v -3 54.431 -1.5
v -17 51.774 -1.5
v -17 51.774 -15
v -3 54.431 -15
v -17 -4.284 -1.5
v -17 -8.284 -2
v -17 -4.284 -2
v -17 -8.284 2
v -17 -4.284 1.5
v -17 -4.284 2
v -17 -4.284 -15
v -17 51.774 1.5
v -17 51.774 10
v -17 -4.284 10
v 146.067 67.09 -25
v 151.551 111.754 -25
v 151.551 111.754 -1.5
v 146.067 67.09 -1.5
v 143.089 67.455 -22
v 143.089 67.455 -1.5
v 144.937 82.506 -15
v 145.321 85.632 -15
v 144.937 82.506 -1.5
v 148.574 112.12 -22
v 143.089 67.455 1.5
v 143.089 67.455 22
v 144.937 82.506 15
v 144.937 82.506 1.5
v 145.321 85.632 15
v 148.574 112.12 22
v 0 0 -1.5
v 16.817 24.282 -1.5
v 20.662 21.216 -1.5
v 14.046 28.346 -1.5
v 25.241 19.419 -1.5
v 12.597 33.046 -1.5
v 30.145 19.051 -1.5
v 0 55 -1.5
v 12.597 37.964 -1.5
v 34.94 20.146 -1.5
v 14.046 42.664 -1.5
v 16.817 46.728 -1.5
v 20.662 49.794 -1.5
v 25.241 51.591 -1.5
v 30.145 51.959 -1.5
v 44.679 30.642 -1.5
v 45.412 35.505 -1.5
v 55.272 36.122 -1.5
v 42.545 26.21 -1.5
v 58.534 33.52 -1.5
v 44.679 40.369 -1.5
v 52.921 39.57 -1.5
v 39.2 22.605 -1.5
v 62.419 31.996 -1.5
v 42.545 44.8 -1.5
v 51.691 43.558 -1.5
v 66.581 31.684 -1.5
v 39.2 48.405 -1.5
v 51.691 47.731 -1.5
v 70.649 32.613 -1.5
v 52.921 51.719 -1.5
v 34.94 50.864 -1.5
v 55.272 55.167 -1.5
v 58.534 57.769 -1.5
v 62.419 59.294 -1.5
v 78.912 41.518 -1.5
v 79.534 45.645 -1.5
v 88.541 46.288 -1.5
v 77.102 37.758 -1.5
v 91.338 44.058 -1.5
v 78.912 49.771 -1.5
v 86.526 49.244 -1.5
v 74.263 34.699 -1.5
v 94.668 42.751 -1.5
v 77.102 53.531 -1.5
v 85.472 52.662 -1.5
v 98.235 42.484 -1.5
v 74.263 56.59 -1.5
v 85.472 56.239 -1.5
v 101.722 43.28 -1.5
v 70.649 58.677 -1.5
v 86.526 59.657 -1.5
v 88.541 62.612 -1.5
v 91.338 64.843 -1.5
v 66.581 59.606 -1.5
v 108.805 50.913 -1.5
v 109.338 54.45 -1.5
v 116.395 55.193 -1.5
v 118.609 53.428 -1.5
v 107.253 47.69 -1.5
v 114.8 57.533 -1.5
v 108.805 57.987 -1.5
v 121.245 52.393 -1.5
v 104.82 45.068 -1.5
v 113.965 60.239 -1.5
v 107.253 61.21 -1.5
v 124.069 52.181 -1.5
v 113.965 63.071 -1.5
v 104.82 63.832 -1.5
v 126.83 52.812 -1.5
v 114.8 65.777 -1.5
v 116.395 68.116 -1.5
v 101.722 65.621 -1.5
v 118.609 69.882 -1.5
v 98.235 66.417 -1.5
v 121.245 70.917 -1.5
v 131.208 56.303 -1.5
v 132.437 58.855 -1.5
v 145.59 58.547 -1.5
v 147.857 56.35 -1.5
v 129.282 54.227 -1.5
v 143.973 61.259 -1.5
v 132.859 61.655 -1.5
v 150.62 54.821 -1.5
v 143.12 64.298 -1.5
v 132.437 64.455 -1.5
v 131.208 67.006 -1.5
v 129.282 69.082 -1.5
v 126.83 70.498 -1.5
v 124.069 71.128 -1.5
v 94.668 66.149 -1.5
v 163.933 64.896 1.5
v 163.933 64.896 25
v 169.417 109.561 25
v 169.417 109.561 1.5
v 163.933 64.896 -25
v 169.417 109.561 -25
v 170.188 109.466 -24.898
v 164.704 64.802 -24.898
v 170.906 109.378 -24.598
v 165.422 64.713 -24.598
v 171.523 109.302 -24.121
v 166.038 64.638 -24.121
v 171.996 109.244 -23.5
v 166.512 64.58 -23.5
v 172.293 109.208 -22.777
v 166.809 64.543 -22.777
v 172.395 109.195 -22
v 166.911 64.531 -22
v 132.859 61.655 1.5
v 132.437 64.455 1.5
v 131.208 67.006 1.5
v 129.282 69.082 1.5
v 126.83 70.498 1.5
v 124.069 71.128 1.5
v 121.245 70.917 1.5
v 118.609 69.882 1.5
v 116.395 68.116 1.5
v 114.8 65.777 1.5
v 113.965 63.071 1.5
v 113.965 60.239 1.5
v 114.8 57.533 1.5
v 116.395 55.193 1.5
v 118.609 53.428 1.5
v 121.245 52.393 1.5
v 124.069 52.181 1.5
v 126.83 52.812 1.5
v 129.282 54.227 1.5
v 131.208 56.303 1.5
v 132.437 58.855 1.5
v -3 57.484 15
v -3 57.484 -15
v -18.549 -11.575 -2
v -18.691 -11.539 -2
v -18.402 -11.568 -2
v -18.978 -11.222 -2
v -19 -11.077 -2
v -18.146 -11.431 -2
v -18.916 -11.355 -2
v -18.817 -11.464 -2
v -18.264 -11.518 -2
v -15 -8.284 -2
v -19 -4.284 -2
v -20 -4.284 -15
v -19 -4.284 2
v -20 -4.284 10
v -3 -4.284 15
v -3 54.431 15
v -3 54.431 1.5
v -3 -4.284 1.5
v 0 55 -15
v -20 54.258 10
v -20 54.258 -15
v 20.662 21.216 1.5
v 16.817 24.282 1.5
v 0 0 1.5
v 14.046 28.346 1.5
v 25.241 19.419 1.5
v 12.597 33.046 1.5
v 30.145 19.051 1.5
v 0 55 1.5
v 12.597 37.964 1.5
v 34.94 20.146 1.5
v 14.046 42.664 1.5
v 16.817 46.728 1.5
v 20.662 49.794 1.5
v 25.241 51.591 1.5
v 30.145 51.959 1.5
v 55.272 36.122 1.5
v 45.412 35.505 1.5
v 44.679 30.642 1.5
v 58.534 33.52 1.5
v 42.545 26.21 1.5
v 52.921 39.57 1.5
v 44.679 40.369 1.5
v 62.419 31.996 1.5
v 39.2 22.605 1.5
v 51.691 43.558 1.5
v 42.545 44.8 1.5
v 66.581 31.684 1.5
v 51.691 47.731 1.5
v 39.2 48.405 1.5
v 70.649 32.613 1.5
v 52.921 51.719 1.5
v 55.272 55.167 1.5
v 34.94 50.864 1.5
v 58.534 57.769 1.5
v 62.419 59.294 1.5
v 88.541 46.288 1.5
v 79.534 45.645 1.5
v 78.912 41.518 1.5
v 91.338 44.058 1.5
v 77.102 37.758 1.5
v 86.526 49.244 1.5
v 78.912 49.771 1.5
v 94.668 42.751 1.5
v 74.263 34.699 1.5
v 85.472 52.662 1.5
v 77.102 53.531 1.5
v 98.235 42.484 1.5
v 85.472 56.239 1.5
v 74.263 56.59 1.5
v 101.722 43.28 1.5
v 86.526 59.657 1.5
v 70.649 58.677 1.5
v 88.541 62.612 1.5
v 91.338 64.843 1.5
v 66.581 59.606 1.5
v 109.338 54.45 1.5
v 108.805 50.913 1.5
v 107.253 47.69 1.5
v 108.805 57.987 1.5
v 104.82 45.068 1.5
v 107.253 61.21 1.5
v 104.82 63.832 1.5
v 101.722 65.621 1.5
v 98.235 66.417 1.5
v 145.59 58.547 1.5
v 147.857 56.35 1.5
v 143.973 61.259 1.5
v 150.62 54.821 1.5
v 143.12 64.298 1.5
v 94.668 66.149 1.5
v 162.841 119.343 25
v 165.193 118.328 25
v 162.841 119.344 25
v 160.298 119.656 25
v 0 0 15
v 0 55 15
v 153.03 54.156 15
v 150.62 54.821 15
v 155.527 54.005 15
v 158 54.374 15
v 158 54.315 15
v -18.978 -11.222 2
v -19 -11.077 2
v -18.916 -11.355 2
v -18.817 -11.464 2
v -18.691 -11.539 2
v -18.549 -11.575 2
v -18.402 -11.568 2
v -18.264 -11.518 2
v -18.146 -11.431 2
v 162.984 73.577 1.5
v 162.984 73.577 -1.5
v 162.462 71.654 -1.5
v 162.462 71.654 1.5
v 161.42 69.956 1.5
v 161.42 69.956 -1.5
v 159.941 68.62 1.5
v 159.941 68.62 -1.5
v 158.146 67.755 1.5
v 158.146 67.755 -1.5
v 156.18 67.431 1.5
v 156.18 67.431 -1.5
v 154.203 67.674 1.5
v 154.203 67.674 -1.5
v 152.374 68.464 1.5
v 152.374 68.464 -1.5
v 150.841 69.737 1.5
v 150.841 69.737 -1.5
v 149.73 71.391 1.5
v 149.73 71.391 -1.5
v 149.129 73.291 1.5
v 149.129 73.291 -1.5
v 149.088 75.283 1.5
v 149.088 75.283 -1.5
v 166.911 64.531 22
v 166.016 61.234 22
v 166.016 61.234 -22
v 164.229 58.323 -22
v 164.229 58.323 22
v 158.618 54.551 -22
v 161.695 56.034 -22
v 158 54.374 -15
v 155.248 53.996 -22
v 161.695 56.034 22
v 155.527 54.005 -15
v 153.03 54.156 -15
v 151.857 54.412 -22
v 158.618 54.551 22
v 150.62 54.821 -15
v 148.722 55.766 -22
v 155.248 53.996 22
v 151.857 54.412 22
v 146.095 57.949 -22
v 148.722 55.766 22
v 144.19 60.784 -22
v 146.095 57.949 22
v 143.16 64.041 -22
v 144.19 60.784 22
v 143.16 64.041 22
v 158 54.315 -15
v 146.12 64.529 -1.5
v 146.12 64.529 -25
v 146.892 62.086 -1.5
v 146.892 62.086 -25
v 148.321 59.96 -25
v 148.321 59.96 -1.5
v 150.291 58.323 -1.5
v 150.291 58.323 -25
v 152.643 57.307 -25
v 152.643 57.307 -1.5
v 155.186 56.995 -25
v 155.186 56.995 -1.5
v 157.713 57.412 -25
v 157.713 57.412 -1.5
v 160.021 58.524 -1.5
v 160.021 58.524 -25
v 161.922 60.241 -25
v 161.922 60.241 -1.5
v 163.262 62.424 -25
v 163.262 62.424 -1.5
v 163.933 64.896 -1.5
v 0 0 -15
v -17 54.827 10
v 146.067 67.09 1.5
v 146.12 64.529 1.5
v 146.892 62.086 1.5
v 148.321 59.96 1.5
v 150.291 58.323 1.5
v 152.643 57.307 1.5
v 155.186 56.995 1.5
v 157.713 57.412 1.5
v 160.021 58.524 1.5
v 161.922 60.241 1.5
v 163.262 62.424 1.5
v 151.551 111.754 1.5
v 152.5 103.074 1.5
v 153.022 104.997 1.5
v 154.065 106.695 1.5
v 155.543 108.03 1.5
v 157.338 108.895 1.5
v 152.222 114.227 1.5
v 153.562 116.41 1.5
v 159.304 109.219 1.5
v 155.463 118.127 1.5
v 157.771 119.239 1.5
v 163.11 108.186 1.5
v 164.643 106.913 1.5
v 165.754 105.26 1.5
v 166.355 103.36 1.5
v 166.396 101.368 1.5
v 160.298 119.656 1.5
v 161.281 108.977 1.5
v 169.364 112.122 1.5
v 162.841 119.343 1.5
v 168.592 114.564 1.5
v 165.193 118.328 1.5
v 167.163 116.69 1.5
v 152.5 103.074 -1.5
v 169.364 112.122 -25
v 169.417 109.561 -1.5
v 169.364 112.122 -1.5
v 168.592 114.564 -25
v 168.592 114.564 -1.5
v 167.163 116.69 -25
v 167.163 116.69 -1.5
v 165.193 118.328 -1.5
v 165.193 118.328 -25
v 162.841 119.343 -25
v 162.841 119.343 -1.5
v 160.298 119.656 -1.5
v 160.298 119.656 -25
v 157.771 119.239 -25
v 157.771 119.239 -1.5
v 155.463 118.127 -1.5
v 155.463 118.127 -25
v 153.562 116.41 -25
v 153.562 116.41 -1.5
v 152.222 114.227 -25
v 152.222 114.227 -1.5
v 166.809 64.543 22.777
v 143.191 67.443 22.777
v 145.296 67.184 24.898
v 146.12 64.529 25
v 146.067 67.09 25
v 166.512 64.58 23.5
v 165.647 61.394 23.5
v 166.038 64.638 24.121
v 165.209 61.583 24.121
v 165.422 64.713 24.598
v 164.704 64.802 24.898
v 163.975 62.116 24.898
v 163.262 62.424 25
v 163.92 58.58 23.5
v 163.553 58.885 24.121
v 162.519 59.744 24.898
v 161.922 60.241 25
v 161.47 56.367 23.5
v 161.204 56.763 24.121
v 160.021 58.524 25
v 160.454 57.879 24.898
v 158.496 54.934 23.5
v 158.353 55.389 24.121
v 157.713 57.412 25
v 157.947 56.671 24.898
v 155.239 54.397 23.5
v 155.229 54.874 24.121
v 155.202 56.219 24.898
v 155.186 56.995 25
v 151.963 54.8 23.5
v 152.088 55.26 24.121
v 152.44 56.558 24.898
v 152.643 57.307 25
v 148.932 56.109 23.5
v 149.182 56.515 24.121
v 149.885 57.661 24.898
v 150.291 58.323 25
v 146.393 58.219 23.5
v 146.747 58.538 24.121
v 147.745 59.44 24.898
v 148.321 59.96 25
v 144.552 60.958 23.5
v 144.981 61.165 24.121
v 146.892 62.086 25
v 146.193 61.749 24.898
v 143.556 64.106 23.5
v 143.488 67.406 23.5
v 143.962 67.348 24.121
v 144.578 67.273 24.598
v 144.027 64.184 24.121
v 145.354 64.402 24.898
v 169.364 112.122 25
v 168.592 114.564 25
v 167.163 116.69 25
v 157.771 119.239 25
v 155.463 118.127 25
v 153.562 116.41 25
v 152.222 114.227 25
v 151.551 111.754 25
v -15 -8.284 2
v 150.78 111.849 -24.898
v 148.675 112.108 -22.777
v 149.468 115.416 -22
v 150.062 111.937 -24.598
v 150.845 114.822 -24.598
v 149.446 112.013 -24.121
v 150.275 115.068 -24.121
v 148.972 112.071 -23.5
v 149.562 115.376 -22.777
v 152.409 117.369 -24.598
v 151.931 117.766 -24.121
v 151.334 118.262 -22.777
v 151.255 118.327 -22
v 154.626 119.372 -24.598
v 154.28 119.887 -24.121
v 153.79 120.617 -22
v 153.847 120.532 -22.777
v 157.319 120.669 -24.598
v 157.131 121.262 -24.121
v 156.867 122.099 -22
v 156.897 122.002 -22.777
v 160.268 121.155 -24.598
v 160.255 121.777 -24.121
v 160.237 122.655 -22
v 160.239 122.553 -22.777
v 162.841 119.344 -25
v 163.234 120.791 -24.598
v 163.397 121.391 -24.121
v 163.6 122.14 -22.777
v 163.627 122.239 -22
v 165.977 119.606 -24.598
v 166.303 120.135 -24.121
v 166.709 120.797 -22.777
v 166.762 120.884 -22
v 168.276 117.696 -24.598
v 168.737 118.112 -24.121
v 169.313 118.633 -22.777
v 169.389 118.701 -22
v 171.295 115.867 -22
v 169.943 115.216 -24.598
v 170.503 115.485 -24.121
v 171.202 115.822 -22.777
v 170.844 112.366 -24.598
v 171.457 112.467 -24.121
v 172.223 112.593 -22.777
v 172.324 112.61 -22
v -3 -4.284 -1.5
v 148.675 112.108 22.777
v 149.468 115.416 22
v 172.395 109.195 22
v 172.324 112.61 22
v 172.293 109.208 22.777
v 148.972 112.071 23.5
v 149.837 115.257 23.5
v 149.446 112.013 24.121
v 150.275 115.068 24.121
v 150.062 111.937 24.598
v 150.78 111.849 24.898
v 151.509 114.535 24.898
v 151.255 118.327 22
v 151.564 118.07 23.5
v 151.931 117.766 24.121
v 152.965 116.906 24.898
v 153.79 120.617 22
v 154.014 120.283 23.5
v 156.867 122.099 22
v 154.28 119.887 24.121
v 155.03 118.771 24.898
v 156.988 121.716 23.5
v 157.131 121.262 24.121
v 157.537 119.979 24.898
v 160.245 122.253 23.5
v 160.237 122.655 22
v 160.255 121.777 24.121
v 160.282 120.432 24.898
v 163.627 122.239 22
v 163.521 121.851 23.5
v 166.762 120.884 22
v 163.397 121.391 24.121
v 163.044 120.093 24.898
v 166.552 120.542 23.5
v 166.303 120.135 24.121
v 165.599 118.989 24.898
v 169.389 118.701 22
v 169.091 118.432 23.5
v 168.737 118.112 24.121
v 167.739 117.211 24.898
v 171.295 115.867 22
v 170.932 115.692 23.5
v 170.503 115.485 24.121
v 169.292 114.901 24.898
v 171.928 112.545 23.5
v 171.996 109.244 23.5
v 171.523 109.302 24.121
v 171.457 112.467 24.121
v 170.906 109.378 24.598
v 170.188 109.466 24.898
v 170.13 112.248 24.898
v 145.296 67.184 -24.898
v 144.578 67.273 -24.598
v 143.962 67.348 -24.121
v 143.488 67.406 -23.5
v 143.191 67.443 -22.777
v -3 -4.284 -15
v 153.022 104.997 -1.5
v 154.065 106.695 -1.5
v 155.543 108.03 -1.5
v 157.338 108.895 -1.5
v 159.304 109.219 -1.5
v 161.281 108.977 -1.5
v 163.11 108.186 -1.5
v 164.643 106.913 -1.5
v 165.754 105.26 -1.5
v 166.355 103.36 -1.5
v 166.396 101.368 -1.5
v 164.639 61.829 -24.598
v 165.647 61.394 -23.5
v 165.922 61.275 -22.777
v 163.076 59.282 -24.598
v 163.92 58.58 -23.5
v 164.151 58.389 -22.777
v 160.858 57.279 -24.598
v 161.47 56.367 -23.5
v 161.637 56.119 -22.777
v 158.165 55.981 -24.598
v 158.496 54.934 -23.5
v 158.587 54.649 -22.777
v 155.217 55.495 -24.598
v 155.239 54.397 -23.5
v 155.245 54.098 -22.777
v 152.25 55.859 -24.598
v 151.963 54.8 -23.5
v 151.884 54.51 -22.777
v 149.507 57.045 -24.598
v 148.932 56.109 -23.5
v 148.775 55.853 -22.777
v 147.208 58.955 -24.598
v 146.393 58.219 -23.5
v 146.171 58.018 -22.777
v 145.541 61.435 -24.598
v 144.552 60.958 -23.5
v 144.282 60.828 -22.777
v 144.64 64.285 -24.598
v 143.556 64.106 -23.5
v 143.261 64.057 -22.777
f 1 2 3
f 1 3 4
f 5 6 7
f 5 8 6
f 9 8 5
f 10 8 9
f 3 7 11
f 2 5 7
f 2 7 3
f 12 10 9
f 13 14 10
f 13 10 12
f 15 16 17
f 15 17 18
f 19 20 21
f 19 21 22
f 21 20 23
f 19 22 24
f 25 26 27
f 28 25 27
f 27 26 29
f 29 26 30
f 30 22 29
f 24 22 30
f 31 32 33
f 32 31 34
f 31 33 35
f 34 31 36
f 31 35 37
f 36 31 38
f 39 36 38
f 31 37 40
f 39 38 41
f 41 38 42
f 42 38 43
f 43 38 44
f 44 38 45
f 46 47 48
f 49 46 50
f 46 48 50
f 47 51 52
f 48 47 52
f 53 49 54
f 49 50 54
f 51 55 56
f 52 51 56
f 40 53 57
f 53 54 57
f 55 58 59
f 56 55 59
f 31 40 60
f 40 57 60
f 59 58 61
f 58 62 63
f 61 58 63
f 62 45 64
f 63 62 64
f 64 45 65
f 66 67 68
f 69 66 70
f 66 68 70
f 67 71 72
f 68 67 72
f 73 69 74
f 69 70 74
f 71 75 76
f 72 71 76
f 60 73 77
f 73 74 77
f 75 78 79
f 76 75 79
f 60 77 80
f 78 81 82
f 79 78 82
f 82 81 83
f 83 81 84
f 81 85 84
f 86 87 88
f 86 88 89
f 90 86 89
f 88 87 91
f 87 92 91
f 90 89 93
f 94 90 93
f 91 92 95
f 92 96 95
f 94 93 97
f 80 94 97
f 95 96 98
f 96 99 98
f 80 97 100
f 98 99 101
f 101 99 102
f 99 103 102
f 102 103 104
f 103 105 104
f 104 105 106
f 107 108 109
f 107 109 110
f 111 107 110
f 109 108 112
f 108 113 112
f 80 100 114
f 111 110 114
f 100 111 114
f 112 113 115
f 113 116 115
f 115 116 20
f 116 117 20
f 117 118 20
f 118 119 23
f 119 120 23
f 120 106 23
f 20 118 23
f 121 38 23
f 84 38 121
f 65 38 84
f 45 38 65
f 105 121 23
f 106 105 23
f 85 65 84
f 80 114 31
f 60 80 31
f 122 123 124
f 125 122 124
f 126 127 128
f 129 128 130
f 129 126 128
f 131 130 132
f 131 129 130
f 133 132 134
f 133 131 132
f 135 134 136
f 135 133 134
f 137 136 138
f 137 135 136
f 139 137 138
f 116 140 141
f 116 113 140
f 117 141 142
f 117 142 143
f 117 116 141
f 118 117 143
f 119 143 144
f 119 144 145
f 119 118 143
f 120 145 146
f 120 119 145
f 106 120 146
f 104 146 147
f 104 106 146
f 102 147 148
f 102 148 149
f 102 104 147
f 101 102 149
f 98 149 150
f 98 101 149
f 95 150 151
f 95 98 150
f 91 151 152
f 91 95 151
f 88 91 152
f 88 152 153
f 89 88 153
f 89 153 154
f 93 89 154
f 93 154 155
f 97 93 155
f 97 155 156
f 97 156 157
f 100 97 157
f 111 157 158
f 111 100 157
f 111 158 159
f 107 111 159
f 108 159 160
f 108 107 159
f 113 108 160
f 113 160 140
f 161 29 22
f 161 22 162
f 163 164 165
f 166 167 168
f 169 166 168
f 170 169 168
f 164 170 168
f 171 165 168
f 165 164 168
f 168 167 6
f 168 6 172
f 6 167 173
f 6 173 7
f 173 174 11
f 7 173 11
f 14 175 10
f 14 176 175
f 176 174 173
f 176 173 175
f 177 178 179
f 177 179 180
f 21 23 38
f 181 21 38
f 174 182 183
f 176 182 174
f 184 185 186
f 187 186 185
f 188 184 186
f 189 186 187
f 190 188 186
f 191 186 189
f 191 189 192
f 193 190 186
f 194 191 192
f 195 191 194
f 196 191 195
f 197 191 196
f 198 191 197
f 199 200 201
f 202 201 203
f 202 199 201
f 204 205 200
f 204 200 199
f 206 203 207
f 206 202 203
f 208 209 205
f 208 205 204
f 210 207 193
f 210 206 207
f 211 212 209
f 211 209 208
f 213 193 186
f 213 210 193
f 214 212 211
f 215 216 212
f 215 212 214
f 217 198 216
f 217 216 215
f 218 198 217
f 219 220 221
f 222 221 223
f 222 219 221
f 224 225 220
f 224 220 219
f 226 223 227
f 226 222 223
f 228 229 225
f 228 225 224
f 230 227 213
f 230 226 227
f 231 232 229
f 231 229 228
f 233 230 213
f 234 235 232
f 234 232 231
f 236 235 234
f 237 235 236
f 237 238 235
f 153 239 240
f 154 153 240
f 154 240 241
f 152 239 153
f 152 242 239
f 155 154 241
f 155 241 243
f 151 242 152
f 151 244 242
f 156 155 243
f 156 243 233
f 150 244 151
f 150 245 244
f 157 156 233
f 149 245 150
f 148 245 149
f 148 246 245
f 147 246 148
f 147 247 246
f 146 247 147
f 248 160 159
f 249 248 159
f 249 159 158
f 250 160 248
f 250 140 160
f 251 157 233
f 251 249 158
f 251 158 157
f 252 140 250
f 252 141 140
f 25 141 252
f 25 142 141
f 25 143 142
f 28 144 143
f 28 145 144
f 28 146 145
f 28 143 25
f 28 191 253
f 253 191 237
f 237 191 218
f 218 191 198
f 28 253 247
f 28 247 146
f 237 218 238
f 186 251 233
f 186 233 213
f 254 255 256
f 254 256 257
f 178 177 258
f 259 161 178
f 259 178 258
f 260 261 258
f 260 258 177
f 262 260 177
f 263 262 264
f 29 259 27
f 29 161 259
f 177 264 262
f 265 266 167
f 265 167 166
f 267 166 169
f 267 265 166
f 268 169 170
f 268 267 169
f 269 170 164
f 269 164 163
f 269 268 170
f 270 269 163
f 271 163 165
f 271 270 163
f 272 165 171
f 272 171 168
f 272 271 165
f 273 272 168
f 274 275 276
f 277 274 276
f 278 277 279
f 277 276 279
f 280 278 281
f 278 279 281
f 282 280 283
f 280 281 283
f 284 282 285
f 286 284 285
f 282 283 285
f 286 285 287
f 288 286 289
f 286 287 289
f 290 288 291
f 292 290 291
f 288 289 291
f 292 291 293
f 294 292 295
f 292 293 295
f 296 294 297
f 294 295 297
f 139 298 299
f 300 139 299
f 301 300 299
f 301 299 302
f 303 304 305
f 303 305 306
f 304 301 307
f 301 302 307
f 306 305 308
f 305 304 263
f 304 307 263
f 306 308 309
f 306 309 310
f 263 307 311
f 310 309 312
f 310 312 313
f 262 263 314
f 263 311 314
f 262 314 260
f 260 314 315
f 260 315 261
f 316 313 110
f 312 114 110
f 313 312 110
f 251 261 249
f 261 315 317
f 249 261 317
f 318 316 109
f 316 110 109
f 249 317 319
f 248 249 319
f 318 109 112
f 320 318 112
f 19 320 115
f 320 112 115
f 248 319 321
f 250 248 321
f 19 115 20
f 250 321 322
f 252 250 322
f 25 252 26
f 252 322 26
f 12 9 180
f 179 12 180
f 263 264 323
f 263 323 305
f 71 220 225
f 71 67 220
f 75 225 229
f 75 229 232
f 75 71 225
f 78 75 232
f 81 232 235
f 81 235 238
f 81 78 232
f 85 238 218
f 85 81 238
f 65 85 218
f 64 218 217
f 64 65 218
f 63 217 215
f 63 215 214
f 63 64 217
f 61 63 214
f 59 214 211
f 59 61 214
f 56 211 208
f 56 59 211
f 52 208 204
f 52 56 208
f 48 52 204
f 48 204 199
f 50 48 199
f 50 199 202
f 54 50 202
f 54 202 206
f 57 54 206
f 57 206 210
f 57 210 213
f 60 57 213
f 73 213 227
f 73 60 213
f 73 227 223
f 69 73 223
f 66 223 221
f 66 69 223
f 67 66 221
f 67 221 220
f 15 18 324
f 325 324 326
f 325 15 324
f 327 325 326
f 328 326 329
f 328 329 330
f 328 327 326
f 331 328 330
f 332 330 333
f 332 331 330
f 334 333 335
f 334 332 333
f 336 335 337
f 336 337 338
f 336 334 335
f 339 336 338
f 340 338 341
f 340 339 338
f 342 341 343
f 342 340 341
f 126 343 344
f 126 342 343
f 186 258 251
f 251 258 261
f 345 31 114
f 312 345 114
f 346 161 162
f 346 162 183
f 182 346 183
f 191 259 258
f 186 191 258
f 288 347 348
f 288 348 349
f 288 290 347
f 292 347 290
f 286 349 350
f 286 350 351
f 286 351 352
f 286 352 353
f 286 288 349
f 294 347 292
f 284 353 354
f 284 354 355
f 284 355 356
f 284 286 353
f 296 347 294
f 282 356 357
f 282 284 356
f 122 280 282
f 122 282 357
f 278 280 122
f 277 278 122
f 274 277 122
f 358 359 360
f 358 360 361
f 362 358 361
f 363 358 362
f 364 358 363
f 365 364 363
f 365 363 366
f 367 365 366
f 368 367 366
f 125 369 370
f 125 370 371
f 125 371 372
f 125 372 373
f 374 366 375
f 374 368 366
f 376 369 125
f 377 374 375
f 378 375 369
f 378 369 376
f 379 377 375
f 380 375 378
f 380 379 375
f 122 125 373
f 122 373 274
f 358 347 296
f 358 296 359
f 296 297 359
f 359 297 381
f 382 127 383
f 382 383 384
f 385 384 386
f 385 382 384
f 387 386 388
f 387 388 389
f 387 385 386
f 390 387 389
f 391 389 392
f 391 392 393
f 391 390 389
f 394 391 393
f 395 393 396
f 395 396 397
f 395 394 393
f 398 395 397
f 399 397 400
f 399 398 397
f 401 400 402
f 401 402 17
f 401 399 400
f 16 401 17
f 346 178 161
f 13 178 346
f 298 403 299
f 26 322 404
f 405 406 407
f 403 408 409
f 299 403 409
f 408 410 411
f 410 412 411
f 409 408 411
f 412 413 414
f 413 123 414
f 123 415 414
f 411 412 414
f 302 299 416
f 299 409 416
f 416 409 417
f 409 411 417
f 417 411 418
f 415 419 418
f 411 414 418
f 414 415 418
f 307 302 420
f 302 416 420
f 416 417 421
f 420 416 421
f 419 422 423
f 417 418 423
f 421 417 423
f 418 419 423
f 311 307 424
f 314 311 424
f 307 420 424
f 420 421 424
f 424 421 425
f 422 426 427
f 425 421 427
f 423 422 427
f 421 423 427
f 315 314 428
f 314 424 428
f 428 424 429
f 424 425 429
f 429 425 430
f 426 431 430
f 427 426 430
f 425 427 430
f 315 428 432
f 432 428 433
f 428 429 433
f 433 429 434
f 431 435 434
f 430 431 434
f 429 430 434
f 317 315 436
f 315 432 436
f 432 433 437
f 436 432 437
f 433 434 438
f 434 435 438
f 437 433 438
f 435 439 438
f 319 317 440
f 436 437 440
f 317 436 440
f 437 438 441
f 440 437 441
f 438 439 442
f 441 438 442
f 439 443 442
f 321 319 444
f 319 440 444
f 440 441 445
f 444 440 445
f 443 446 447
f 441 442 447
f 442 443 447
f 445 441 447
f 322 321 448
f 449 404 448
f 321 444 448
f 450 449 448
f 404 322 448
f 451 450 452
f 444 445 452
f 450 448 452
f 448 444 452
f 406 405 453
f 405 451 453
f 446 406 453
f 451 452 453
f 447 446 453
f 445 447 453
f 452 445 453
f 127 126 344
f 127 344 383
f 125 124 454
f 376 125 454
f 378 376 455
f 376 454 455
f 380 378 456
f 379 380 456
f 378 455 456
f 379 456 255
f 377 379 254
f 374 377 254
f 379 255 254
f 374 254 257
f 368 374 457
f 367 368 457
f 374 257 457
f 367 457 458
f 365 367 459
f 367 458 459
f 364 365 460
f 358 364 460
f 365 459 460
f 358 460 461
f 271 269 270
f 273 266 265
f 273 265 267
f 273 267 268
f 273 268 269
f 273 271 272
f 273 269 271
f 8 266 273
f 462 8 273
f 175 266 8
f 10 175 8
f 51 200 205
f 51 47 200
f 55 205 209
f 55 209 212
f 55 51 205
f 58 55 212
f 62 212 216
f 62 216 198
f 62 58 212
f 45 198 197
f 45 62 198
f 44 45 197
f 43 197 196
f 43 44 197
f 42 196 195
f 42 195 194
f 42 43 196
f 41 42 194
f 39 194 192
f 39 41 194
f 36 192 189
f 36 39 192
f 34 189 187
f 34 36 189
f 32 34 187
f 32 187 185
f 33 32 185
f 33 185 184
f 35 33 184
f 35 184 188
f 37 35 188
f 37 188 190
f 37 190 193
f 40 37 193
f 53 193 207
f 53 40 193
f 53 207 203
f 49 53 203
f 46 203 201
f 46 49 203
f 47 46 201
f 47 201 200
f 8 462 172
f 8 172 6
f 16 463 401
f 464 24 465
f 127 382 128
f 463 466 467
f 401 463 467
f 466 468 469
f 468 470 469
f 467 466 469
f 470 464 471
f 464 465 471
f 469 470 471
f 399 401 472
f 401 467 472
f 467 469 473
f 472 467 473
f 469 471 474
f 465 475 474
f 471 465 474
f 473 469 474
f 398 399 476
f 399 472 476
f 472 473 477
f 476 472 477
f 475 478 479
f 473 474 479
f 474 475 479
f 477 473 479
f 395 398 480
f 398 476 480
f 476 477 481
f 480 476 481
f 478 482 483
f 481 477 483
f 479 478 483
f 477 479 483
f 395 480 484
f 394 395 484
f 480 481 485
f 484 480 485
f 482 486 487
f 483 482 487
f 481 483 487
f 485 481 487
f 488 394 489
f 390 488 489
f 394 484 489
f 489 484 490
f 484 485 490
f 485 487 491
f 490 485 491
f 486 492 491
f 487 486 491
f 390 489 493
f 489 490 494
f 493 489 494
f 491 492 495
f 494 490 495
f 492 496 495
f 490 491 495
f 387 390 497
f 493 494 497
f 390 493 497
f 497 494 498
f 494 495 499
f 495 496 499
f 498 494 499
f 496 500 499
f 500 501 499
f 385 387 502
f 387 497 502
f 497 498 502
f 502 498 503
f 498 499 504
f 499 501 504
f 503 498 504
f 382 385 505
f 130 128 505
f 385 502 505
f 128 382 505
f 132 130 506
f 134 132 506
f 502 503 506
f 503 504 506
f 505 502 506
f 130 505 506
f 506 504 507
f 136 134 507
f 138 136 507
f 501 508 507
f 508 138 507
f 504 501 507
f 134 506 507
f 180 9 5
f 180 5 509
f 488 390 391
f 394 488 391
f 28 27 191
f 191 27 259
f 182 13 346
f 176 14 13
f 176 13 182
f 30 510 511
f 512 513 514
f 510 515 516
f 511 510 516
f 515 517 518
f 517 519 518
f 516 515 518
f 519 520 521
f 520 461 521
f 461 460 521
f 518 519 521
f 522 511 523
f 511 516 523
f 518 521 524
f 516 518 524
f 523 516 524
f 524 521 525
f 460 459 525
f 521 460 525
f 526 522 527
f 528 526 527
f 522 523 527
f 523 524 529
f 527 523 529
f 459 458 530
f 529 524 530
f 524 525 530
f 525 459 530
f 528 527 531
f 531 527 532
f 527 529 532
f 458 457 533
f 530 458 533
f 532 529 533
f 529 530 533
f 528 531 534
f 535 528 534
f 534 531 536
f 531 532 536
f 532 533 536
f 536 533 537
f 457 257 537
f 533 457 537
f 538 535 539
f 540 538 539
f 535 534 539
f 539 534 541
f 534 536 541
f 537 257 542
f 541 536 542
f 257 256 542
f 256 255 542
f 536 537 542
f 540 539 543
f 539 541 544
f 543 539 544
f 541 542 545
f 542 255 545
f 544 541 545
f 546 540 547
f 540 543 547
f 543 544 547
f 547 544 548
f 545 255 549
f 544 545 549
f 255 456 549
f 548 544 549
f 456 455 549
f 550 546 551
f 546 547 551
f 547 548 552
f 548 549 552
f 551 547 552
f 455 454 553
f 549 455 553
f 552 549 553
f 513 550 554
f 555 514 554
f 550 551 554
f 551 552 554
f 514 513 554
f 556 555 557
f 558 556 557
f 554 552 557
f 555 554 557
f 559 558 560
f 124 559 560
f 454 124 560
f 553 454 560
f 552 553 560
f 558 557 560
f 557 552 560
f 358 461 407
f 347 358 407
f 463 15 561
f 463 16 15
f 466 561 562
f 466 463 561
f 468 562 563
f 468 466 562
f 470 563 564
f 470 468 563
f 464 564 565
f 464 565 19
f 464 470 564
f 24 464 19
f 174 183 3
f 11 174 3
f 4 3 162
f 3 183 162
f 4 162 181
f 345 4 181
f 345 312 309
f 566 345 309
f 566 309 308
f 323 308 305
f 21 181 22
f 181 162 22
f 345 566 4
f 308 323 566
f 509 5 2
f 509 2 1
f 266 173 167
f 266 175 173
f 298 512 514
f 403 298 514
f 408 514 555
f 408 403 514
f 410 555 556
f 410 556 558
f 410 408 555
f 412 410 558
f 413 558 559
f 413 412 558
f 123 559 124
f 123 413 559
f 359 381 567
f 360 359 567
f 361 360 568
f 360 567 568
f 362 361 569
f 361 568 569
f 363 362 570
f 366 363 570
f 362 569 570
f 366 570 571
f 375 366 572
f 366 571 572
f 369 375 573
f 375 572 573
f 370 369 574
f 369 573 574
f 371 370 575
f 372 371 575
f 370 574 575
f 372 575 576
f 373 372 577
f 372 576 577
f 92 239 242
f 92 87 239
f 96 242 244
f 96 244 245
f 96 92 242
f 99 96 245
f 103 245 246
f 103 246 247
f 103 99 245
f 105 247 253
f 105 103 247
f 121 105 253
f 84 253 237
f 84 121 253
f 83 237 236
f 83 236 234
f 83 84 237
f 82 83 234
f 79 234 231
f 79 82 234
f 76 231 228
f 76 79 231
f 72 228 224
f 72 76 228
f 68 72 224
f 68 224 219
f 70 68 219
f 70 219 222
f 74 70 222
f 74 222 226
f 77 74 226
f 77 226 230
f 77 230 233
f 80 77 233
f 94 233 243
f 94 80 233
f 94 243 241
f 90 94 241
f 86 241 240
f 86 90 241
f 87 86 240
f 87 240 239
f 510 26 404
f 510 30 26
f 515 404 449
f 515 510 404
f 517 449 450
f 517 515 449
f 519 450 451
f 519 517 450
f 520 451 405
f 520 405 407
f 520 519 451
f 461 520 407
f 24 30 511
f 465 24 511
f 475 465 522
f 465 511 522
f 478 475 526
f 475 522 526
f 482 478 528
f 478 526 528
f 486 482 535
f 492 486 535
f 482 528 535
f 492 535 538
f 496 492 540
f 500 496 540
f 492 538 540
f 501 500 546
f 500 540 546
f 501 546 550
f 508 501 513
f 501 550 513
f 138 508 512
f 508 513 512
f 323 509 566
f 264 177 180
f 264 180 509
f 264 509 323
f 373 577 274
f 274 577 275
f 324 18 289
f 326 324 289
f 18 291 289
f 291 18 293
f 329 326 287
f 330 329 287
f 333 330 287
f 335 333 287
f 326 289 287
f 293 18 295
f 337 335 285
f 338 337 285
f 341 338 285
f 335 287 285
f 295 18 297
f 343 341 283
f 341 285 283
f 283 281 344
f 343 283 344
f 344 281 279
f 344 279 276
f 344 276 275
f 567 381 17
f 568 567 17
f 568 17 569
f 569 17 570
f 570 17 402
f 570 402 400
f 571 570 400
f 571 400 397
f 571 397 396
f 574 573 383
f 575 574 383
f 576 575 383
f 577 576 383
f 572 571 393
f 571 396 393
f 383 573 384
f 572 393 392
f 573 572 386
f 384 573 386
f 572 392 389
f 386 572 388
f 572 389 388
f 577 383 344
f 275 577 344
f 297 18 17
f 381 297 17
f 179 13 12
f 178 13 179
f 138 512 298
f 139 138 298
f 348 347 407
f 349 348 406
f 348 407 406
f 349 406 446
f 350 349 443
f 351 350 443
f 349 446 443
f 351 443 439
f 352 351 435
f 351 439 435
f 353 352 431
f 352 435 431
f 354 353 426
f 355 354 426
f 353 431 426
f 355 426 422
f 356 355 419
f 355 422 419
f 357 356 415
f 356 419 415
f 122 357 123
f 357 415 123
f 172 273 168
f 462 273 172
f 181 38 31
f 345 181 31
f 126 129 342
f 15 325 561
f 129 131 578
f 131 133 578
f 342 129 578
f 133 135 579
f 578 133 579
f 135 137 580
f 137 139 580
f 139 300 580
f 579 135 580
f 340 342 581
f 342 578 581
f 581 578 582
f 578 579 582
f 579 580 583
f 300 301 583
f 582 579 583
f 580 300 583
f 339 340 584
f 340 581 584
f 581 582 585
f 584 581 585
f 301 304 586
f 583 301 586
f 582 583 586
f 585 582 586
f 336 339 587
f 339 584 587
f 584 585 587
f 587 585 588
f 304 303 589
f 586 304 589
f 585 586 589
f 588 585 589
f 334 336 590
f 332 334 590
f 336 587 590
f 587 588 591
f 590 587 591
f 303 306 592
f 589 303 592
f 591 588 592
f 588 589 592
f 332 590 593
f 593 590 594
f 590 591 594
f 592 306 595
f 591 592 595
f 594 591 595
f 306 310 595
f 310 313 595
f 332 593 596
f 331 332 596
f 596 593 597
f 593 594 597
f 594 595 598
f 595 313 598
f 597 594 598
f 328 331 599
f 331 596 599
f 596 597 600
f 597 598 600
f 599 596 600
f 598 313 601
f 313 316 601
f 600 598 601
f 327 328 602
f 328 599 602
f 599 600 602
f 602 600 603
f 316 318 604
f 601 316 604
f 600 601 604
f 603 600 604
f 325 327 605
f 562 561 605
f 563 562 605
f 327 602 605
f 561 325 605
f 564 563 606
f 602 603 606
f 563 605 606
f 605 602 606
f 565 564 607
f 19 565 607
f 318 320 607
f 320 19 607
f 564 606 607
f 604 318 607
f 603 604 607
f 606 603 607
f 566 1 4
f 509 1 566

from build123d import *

# Parameters (mm, degrees)
SCHIZZO1_R                    = 16.5
SCHIZZO1_R_2                  = 14
SCHIZZO1_R_3                  = 12
SCHIZZO1_R_4                  = 9.5
ESTRUSIONE_ESTRUSIONE1_DEPTH  = 1.5
ESTRUSIONE_SOTTILE4_DEPTH     = 15
ESTRUSIONE_ESTRUSIONE2_DEPTH  = 25
TAGLIO_ESTRUSIONE1_DEPTH      = 23.5
TAGLIO_ESTRUSIONE2_DEPTH      = 214.121208684
TAGLIO_ESTRUSIONE2_DEPTH_BACK = 214.121208684
ESTRUSIONE_SOTTILE5_DEPTH     = 15
ESTRUSIONE_ESTRUSIONE3_DEPTH  = 1.5
TAGLIO_ESTRUSIONE4_START      = -4.28444402
TAGLIO_ESTRUSIONE4_DEPTH      = 61.768658905
ESTRUSIONE_ESTRUSIONE5_DEPTH  = 2
RACCORDO4_R                   = 3
RACCORDO5_R                   = 3


# Read off the part's stored shape, not the designer's step: Taglio-Estrusione4
with BuildPart() as part:
    # Schizzo1 → Estrusione-Estrusione1 (new, symmetric)
    with BuildSketch(Plane.XY):
        Polygon((0, 55), (0, 0), (155, 56.415386311), (155, 84.415386311), align=None)
        with Locations((28.912269587, 35.505040119)):
            Circle(SCHIZZO1_R, mode=Mode.SUBTRACT)
        with Locations((65.534477731, 45.644757604)):
            Circle(SCHIZZO1_R_2, mode=Mode.SUBTRACT)
        with Locations((97.337974277, 54.450301735)):
            Circle(SCHIZZO1_R_3, mode=Mode.SUBTRACT)
        with Locations((123.359016906, 61.654837842)):
            Circle(SCHIZZO1_R_4, mode=Mode.SUBTRACT)
    extrude(amount=ESTRUSIONE_ESTRUSIONE1_DEPTH, both=True)

    # Schizzo5 → Estrusione-Sottile4 (add, symmetric)
    with BuildSketch(Plane.XY):
        Polygon((158, 88.038261311), (-3, 57.484214885), (-3, -4.28444402), (158, 54.314763697), align=None)
        Polygon((155, 84.415386311), (0, 55), (0, 0), (155, 56.415386311), align=None, mode=Mode.SUBTRACT)
    extrude(amount=ESTRUSIONE_SOTTILE4_DEPTH, both=True)

    # Schizzo6 → Estrusione-Estrusione2 (add, symmetric)
    with BuildSketch(Plane.XY):
        with BuildLine():
            Line((143.08944618, 67.455418384), (148.573566634, 112.119995208))
            ThreePointArc((148.573566634, 112.119995208), (161.946552574, 122.568116907), (172.394674273, 109.195130967))
            Line((172.394674273, 109.195130967), (166.91055382, 64.530554143))
            ThreePointArc((166.91055382, 64.530554143), (153.537567879, 54.082432444), (143.08944618, 67.455418384))
        make_face()
    extrude(amount=ESTRUSIONE_ESTRUSIONE2_DEPTH, both=True)

    # Schizzo7 → Taglio-Estrusione1 (cut)
    with BuildSketch(Plane.XY.offset(25)):
        with BuildLine():
            Line((163.932915365, 64.896162173), (169.417035818, 109.560738997))
            ThreePointArc((169.417035818, 109.560738997), (161.580944544, 119.590478452), (151.551205088, 111.754387178))
            Line((151.551205088, 111.754387178), (146.067084635, 67.089810354))
            ThreePointArc((146.067084635, 67.089810354), (153.903175909, 57.060070899), (163.932915365, 64.896162173))
        make_face()
    taglio_estrusione1 = extrude(amount=-TAGLIO_ESTRUSIONE1_DEPTH, mode=Mode.SUBTRACT)

    # Specchia1: Taglio-Estrusione1 across plane
    add(taglio_estrusione1.mirror(Plane.XY), mode=Mode.SUBTRACT)

    # Schizzo8 → Taglio-Estrusione2 (cut, two sides: drawn at the far end of the back side and taken through both)
    with BuildSketch(Plane.XY.offset(-TAGLIO_ESTRUSIONE2_DEPTH_BACK)):
        with BuildLine():
            Line((149.088066357, 75.282713956), (152.500407973, 103.074006202))
            ThreePointArc((152.500407973, 103.074006202), (160.301316438, 109.16874386), (166.396054096, 101.367835395))
            Line((166.396054096, 101.367835395), (162.98371248, 73.576543149))
            ThreePointArc((162.98371248, 73.576543149), (155.182804015, 67.481805491), (149.088066357, 75.282713956))
        make_face()
    extrude(amount=TAGLIO_ESTRUSIONE2_DEPTH + TAGLIO_ESTRUSIONE2_DEPTH_BACK, mode=Mode.SUBTRACT)

    # Schizzo9 → Estrusione-Sottile5 (add, symmetric)
    with BuildSketch(Plane.XY):
        Polygon((-3, 57.484214885), (-20, 54.258011225), (-20, -4.28444402), (-17, -4.28444402), (-17, 51.77379634), (-2.440653337, 54.536820898), align=None)
    extrude(amount=ESTRUSIONE_SOTTILE5_DEPTH, both=True)

    # Schizzo12 → Estrusione-Estrusione3 (add, symmetric)
    with BuildSketch(Plane.XY):
        Polygon((-17, 51.77379634), (-17, -4.28444402), (-3, -4.28444402), (-3, 54.430669942), align=None)
    extrude(amount=ESTRUSIONE_ESTRUSIONE3_DEPTH, both=True)

    # Taglio-Estrusione4 outline → Taglio-Estrusione4 (cut)
    with BuildSketch(Plane(origin=(0, 0, 0), x_dir=(1, 0, 0), z_dir=(0, 1, 0)).offset(TAGLIO_ESTRUSIONE4_START)):
        Polygon((-3, -15), (-17, -10), (-20, -10), (-20, -15), align=None)
    extrude(amount=TAGLIO_ESTRUSIONE4_DEPTH, mode=Mode.SUBTRACT)

    # Schizzo22 → Estrusione-Estrusione5 (add, symmetric)
    with BuildSketch(Plane.XY):
        with BuildLine():
            Line((-19, -4.28444402), (-19, -11.077337239))
            ThreePointArc((-19, -11.077337239), (-18.691341716, -11.539277005), (-18.146446609, -11.43089063))
            Line((-18.146446609, -11.43089063), (-15, -8.28444402))
            Line((-15, -8.28444402), (-17, -8.28444402))
            Line((-17, -8.28444402), (-17, -4.28444402))
            Line((-17, -4.28444402), (-19, -4.28444402))
        make_face()
    extrude(amount=ESTRUSIONE_ESTRUSIONE5_DEPTH, both=True)

    # Raccordo4
    raccordo4_edges = [part.edges().sort_by_distance(p)[0] for p in [
        (153.537567879, 54.082432444, 25),
        (169.652614046, 86.862842555, 25),
        (161.946552574, 122.568116907, 25),
        (145.831506407, 89.787706796, 25),
    ]]
    fillet(raccordo4_edges, radius=RACCORDO4_R - 0.0001)  # a hair under: the kernel refuses the full size

    # Raccordo5
    raccordo5_edges = [part.edges().sort_by_distance(p)[0] for p in [
        (145.831506407, 89.787706796, -25),
        (153.537567879, 54.082432444, -25),
        (169.652614046, 86.862842555, -25),
        (161.946552574, 122.568116907, -25),
    ]]
    fillet(raccordo5_edges, radius=RACCORDO5_R - 0.0001)  # a hair under: the kernel refuses the full size


solid = part.part
